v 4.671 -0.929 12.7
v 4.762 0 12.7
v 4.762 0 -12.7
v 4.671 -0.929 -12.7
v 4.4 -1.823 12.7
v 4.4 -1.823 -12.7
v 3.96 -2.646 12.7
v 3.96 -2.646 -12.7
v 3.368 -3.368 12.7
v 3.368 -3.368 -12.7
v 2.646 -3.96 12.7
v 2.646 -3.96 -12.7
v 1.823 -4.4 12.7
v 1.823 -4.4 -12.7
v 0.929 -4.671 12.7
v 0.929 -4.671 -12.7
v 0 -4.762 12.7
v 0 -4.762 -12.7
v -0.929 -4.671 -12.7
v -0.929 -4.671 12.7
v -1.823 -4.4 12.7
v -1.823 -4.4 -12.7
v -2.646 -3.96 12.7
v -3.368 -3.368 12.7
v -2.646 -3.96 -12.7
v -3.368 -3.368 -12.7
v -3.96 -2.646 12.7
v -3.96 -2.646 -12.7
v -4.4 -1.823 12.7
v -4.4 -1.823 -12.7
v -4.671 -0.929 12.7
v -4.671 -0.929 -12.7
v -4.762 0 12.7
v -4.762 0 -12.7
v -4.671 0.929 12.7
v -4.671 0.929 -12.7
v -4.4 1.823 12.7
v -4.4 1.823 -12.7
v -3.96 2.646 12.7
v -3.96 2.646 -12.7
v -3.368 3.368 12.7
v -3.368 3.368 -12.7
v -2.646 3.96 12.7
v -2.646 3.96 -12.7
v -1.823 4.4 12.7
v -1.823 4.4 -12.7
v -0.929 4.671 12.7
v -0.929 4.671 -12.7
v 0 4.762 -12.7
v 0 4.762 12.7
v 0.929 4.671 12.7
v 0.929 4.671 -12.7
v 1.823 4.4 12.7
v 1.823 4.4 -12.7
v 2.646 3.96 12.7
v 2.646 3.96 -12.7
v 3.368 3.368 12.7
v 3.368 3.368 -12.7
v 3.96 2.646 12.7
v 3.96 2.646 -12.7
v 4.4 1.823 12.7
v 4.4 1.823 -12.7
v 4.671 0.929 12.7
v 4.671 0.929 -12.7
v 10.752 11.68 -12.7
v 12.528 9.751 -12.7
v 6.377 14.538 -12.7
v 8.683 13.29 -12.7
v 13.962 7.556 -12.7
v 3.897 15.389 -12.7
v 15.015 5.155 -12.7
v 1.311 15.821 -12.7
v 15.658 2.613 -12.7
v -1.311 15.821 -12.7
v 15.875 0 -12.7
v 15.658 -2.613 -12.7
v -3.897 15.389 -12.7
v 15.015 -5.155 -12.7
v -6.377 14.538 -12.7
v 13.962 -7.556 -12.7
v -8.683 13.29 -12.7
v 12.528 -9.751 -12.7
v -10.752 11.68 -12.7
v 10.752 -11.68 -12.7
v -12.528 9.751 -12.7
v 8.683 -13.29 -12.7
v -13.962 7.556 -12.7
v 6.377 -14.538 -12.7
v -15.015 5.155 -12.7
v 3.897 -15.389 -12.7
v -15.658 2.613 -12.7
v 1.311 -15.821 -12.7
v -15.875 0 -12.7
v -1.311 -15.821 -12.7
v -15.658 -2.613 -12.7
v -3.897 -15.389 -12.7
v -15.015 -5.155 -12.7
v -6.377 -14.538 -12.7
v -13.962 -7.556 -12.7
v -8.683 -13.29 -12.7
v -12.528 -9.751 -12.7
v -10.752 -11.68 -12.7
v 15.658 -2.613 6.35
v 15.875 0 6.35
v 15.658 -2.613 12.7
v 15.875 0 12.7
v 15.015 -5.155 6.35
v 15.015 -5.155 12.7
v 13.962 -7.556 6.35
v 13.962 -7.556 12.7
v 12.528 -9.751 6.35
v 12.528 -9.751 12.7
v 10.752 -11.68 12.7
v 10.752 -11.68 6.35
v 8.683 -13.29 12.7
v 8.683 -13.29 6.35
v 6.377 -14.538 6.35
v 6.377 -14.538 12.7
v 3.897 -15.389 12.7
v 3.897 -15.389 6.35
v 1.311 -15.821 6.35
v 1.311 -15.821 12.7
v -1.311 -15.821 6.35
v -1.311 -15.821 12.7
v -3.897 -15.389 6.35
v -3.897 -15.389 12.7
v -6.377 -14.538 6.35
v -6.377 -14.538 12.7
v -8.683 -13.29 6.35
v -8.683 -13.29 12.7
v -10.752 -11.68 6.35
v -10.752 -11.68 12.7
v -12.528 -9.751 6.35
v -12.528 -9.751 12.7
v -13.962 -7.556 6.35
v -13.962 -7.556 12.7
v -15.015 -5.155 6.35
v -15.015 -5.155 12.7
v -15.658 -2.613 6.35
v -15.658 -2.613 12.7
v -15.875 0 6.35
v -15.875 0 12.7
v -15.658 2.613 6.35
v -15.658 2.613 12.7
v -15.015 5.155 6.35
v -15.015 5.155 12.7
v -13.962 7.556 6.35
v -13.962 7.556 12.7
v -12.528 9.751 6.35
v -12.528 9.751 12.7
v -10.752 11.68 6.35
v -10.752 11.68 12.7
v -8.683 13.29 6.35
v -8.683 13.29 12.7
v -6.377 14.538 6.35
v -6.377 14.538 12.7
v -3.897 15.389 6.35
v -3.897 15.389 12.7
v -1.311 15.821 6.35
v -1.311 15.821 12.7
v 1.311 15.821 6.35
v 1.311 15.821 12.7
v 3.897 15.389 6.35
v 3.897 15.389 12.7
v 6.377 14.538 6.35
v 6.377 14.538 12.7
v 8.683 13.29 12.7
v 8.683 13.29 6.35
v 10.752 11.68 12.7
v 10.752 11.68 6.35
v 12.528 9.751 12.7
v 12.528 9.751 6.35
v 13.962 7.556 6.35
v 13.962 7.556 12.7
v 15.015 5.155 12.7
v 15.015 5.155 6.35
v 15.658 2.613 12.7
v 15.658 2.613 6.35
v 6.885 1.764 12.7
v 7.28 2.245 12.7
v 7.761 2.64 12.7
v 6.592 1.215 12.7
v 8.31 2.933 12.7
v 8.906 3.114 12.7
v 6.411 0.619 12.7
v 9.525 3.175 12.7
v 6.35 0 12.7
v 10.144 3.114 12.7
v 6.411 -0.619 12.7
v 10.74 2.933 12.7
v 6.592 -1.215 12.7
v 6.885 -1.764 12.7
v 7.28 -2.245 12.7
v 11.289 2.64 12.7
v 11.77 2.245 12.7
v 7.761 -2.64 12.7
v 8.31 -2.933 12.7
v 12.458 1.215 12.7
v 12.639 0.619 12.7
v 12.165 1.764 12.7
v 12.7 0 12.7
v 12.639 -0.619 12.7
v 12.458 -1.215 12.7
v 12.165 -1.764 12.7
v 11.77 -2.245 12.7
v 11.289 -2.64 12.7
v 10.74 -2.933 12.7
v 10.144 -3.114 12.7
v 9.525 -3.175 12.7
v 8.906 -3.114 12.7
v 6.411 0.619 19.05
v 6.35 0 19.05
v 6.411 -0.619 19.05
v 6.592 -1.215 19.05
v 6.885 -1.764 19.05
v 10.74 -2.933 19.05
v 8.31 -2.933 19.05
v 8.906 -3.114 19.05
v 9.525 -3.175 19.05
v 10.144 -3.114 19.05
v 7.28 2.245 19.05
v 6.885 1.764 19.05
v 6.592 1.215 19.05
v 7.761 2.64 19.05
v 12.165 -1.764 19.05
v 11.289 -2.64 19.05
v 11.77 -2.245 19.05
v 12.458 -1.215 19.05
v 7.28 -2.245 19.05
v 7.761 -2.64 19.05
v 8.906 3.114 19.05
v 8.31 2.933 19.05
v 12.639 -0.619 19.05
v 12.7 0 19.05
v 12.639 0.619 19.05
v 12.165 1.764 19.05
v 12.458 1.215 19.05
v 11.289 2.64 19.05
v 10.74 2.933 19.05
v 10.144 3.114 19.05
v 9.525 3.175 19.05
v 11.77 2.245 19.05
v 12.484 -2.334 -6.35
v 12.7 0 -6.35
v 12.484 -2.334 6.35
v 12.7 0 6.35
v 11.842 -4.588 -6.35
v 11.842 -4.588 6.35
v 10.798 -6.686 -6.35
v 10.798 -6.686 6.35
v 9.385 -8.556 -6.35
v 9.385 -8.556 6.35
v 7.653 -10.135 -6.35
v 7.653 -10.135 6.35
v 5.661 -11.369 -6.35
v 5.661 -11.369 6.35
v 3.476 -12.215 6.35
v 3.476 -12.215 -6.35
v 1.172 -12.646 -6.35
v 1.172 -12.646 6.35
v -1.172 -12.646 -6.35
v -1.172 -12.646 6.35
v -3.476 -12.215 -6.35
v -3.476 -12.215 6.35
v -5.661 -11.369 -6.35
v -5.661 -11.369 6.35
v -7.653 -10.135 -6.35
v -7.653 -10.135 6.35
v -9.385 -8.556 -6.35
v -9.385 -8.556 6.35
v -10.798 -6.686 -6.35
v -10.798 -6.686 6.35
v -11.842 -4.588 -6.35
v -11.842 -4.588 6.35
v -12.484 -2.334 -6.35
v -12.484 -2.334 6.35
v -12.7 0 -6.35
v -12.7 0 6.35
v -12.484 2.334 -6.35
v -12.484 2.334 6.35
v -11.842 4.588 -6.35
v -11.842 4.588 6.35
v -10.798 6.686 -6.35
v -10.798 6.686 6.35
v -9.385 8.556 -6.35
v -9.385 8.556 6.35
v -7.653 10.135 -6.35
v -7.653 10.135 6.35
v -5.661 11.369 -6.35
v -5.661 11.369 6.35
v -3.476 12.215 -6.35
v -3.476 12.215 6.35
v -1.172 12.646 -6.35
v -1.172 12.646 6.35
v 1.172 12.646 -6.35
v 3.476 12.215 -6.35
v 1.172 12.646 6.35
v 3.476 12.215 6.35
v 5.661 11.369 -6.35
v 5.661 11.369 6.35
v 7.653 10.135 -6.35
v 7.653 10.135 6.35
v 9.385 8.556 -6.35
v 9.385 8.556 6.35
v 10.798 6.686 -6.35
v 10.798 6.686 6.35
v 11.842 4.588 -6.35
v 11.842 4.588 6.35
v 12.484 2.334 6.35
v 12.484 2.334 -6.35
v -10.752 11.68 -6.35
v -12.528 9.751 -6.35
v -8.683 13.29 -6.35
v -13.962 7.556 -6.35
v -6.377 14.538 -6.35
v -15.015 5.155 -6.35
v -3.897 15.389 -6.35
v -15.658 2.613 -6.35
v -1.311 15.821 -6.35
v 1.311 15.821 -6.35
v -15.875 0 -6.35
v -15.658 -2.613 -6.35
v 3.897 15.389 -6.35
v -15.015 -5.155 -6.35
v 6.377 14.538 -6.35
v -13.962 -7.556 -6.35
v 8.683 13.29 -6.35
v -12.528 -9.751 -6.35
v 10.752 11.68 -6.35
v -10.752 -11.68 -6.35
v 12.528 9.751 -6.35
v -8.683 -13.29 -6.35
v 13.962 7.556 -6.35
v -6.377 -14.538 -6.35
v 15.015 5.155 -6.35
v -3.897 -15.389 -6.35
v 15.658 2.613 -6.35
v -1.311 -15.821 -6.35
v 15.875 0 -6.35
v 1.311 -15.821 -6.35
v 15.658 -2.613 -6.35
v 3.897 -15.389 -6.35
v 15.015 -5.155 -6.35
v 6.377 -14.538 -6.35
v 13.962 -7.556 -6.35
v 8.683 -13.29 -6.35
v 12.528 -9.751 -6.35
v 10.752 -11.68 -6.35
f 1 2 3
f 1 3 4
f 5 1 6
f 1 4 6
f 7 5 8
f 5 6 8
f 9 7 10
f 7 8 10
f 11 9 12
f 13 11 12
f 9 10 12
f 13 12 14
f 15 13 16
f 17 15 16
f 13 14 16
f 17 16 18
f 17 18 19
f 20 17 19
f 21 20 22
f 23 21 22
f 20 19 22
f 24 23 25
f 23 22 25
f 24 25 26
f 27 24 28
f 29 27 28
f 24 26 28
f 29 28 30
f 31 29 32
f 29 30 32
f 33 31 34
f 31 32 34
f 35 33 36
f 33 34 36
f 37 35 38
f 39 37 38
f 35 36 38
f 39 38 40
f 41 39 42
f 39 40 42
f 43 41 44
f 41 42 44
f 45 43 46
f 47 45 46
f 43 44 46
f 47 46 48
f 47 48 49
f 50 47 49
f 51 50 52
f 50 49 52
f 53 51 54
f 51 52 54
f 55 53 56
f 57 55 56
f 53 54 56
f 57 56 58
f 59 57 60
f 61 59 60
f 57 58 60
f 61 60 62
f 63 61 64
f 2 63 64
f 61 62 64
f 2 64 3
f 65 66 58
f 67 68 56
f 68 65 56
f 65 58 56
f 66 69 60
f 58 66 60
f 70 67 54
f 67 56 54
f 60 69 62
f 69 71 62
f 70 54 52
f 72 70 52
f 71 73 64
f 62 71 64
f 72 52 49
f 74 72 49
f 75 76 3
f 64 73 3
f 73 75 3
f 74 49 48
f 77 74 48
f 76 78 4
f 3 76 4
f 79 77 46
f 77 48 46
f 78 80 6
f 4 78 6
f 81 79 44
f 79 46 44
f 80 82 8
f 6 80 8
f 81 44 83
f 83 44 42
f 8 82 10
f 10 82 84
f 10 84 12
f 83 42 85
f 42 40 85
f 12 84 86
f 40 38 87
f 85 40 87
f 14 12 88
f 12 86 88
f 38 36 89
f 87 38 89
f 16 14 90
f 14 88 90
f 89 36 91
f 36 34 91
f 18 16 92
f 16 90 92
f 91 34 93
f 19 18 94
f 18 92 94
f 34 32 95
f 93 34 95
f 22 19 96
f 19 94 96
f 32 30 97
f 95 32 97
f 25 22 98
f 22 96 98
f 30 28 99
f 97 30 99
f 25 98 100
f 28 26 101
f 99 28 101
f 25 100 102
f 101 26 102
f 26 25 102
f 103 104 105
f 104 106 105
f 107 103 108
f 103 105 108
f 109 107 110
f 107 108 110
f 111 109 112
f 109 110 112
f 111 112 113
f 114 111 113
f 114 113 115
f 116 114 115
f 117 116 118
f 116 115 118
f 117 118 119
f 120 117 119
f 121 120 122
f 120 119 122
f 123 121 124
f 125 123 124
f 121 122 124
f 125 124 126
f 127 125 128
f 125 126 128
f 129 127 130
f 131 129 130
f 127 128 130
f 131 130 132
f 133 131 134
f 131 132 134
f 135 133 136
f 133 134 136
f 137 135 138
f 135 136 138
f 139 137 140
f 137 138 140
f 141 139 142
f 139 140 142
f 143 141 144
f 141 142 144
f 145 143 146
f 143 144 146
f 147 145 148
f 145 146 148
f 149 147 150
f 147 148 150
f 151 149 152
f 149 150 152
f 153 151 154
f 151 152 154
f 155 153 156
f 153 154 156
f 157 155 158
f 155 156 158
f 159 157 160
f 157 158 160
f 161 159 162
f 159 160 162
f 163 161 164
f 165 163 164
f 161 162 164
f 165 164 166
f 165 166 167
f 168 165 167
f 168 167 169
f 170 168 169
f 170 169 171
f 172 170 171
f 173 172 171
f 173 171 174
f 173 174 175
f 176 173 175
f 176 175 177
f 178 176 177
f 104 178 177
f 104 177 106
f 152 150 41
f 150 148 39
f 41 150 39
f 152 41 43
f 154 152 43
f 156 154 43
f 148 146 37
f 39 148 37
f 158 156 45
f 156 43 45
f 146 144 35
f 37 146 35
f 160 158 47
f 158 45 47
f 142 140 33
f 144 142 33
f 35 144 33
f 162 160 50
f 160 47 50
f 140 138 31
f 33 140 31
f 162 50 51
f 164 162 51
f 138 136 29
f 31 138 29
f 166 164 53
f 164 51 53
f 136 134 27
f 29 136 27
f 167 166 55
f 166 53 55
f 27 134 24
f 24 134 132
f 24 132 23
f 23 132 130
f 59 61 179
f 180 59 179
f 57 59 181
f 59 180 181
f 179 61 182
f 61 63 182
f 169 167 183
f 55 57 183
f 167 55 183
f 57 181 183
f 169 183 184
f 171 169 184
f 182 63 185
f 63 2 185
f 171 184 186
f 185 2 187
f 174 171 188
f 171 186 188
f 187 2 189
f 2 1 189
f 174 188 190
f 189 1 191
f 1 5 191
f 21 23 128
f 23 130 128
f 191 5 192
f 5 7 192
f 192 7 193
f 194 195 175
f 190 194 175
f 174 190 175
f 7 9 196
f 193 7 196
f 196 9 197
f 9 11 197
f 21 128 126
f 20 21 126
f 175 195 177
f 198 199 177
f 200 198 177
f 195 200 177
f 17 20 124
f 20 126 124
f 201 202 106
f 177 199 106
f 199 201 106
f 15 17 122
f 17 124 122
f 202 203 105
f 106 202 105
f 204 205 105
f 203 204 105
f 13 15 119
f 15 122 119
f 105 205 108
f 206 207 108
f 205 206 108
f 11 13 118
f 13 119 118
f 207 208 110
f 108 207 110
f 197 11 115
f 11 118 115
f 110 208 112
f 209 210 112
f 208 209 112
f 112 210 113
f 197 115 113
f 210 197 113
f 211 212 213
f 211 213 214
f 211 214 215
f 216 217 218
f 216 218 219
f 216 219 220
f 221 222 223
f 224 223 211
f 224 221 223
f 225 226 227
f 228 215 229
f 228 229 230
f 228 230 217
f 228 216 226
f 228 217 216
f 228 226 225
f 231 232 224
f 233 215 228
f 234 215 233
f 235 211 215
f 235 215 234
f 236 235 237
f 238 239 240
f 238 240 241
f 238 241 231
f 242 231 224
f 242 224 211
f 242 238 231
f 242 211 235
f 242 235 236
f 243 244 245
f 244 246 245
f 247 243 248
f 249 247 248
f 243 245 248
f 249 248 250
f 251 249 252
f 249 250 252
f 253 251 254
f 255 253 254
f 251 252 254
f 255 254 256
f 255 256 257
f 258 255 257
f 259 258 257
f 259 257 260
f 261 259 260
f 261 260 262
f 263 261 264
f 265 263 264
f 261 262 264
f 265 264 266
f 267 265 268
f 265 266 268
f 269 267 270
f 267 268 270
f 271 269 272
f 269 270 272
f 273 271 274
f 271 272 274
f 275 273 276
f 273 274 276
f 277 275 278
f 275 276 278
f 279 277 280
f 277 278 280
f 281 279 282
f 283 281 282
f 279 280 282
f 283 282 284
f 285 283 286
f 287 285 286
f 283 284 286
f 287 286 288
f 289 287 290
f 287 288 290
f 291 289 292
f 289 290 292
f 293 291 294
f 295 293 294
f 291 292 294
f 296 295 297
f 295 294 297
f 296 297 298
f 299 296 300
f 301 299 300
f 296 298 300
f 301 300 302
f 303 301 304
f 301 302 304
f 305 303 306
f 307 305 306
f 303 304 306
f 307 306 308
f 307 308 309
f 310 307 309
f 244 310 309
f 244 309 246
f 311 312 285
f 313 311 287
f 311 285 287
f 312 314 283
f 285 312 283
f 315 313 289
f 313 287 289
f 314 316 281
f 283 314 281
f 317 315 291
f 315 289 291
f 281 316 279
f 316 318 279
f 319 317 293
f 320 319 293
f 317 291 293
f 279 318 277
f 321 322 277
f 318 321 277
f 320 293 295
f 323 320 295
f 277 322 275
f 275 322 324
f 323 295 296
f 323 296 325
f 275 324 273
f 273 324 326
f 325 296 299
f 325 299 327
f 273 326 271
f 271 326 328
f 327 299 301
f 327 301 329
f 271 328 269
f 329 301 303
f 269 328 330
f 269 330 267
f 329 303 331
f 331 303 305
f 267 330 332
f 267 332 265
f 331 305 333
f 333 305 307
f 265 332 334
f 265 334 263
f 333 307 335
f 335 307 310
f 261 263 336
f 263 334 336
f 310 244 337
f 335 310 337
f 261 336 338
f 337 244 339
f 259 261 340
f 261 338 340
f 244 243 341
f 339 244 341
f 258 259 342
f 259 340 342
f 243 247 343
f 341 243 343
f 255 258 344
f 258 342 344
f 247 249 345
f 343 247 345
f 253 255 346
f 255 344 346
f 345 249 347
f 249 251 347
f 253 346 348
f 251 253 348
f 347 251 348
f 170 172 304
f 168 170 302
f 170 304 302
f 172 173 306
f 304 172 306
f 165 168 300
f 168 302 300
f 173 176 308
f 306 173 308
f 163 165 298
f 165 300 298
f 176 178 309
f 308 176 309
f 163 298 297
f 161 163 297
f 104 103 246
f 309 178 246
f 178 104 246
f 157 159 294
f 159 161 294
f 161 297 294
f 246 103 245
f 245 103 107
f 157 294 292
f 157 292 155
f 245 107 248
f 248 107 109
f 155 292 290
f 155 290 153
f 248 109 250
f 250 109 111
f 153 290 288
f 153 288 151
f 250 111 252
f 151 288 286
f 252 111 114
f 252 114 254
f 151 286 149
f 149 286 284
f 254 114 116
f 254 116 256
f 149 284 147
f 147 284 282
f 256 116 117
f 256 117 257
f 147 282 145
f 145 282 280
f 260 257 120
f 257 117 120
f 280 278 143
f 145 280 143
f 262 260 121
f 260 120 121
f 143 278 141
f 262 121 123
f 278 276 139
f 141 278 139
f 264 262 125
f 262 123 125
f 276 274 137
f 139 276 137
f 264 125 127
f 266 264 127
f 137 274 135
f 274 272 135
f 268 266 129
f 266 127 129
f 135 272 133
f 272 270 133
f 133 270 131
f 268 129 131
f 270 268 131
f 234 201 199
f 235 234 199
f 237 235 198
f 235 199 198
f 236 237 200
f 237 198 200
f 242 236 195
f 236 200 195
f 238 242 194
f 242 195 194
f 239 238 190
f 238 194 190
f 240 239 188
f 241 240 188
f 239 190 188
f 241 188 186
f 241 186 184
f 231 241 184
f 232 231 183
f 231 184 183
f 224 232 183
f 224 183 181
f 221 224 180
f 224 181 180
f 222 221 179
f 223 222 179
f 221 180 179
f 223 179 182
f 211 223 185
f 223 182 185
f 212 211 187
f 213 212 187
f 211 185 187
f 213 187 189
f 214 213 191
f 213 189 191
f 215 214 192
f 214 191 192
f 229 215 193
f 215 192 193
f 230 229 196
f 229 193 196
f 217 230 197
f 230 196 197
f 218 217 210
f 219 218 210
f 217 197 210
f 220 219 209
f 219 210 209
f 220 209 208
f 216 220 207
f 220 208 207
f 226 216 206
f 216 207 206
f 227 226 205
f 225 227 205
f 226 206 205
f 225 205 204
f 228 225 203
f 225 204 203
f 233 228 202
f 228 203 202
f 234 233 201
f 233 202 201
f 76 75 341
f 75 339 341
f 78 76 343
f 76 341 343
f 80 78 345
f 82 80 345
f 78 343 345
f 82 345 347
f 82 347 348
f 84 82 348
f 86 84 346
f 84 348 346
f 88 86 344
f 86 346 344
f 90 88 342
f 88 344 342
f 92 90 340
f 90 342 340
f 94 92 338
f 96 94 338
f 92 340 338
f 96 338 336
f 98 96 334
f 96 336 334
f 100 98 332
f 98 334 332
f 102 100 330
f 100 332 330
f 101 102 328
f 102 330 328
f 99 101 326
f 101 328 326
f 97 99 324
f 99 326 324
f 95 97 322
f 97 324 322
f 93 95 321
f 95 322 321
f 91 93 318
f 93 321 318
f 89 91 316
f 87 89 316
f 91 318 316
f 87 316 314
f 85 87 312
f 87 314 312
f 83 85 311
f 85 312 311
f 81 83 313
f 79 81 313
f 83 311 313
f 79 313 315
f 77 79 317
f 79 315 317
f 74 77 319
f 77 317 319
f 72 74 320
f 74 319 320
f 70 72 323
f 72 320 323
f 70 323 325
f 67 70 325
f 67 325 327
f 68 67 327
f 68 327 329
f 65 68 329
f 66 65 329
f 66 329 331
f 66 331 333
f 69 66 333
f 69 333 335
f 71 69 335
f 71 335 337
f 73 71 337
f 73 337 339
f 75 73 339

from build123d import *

# Parameters (mm, degrees)
F0_W     = 7.9375
F0_H     = 12.7
F2_R     = 3.175
F3_DEPTH = 6.35


with BuildPart() as f1:
    # F0 (on Front) → F1 (revolve)
    with BuildSketch(Plane.XZ):
        Polygon((4.7625, 12.7), (4.7625, 6.35), (12.7, 6.35), (15.875, 6.35), (15.875, 12.7), align=None)
        with Locations((8.73125, 0)):
            Rectangle(F0_W, F0_H)
        Polygon((12.7, -6.35), (4.7625, -6.35), (4.7625, -12.7), (15.875, -12.7), (15.875, -6.35), align=None)
    revolve(axis=Axis((0, 0, 0), (0, 0, -1)))

    # F2 (on face) → F3 (join)
    with BuildSketch(Plane.XY.offset(12.7)):
        with Locations((9.525, 0)):
            Circle(F2_R)
    extrude(amount=F3_DEPTH)


solid = f1.part
